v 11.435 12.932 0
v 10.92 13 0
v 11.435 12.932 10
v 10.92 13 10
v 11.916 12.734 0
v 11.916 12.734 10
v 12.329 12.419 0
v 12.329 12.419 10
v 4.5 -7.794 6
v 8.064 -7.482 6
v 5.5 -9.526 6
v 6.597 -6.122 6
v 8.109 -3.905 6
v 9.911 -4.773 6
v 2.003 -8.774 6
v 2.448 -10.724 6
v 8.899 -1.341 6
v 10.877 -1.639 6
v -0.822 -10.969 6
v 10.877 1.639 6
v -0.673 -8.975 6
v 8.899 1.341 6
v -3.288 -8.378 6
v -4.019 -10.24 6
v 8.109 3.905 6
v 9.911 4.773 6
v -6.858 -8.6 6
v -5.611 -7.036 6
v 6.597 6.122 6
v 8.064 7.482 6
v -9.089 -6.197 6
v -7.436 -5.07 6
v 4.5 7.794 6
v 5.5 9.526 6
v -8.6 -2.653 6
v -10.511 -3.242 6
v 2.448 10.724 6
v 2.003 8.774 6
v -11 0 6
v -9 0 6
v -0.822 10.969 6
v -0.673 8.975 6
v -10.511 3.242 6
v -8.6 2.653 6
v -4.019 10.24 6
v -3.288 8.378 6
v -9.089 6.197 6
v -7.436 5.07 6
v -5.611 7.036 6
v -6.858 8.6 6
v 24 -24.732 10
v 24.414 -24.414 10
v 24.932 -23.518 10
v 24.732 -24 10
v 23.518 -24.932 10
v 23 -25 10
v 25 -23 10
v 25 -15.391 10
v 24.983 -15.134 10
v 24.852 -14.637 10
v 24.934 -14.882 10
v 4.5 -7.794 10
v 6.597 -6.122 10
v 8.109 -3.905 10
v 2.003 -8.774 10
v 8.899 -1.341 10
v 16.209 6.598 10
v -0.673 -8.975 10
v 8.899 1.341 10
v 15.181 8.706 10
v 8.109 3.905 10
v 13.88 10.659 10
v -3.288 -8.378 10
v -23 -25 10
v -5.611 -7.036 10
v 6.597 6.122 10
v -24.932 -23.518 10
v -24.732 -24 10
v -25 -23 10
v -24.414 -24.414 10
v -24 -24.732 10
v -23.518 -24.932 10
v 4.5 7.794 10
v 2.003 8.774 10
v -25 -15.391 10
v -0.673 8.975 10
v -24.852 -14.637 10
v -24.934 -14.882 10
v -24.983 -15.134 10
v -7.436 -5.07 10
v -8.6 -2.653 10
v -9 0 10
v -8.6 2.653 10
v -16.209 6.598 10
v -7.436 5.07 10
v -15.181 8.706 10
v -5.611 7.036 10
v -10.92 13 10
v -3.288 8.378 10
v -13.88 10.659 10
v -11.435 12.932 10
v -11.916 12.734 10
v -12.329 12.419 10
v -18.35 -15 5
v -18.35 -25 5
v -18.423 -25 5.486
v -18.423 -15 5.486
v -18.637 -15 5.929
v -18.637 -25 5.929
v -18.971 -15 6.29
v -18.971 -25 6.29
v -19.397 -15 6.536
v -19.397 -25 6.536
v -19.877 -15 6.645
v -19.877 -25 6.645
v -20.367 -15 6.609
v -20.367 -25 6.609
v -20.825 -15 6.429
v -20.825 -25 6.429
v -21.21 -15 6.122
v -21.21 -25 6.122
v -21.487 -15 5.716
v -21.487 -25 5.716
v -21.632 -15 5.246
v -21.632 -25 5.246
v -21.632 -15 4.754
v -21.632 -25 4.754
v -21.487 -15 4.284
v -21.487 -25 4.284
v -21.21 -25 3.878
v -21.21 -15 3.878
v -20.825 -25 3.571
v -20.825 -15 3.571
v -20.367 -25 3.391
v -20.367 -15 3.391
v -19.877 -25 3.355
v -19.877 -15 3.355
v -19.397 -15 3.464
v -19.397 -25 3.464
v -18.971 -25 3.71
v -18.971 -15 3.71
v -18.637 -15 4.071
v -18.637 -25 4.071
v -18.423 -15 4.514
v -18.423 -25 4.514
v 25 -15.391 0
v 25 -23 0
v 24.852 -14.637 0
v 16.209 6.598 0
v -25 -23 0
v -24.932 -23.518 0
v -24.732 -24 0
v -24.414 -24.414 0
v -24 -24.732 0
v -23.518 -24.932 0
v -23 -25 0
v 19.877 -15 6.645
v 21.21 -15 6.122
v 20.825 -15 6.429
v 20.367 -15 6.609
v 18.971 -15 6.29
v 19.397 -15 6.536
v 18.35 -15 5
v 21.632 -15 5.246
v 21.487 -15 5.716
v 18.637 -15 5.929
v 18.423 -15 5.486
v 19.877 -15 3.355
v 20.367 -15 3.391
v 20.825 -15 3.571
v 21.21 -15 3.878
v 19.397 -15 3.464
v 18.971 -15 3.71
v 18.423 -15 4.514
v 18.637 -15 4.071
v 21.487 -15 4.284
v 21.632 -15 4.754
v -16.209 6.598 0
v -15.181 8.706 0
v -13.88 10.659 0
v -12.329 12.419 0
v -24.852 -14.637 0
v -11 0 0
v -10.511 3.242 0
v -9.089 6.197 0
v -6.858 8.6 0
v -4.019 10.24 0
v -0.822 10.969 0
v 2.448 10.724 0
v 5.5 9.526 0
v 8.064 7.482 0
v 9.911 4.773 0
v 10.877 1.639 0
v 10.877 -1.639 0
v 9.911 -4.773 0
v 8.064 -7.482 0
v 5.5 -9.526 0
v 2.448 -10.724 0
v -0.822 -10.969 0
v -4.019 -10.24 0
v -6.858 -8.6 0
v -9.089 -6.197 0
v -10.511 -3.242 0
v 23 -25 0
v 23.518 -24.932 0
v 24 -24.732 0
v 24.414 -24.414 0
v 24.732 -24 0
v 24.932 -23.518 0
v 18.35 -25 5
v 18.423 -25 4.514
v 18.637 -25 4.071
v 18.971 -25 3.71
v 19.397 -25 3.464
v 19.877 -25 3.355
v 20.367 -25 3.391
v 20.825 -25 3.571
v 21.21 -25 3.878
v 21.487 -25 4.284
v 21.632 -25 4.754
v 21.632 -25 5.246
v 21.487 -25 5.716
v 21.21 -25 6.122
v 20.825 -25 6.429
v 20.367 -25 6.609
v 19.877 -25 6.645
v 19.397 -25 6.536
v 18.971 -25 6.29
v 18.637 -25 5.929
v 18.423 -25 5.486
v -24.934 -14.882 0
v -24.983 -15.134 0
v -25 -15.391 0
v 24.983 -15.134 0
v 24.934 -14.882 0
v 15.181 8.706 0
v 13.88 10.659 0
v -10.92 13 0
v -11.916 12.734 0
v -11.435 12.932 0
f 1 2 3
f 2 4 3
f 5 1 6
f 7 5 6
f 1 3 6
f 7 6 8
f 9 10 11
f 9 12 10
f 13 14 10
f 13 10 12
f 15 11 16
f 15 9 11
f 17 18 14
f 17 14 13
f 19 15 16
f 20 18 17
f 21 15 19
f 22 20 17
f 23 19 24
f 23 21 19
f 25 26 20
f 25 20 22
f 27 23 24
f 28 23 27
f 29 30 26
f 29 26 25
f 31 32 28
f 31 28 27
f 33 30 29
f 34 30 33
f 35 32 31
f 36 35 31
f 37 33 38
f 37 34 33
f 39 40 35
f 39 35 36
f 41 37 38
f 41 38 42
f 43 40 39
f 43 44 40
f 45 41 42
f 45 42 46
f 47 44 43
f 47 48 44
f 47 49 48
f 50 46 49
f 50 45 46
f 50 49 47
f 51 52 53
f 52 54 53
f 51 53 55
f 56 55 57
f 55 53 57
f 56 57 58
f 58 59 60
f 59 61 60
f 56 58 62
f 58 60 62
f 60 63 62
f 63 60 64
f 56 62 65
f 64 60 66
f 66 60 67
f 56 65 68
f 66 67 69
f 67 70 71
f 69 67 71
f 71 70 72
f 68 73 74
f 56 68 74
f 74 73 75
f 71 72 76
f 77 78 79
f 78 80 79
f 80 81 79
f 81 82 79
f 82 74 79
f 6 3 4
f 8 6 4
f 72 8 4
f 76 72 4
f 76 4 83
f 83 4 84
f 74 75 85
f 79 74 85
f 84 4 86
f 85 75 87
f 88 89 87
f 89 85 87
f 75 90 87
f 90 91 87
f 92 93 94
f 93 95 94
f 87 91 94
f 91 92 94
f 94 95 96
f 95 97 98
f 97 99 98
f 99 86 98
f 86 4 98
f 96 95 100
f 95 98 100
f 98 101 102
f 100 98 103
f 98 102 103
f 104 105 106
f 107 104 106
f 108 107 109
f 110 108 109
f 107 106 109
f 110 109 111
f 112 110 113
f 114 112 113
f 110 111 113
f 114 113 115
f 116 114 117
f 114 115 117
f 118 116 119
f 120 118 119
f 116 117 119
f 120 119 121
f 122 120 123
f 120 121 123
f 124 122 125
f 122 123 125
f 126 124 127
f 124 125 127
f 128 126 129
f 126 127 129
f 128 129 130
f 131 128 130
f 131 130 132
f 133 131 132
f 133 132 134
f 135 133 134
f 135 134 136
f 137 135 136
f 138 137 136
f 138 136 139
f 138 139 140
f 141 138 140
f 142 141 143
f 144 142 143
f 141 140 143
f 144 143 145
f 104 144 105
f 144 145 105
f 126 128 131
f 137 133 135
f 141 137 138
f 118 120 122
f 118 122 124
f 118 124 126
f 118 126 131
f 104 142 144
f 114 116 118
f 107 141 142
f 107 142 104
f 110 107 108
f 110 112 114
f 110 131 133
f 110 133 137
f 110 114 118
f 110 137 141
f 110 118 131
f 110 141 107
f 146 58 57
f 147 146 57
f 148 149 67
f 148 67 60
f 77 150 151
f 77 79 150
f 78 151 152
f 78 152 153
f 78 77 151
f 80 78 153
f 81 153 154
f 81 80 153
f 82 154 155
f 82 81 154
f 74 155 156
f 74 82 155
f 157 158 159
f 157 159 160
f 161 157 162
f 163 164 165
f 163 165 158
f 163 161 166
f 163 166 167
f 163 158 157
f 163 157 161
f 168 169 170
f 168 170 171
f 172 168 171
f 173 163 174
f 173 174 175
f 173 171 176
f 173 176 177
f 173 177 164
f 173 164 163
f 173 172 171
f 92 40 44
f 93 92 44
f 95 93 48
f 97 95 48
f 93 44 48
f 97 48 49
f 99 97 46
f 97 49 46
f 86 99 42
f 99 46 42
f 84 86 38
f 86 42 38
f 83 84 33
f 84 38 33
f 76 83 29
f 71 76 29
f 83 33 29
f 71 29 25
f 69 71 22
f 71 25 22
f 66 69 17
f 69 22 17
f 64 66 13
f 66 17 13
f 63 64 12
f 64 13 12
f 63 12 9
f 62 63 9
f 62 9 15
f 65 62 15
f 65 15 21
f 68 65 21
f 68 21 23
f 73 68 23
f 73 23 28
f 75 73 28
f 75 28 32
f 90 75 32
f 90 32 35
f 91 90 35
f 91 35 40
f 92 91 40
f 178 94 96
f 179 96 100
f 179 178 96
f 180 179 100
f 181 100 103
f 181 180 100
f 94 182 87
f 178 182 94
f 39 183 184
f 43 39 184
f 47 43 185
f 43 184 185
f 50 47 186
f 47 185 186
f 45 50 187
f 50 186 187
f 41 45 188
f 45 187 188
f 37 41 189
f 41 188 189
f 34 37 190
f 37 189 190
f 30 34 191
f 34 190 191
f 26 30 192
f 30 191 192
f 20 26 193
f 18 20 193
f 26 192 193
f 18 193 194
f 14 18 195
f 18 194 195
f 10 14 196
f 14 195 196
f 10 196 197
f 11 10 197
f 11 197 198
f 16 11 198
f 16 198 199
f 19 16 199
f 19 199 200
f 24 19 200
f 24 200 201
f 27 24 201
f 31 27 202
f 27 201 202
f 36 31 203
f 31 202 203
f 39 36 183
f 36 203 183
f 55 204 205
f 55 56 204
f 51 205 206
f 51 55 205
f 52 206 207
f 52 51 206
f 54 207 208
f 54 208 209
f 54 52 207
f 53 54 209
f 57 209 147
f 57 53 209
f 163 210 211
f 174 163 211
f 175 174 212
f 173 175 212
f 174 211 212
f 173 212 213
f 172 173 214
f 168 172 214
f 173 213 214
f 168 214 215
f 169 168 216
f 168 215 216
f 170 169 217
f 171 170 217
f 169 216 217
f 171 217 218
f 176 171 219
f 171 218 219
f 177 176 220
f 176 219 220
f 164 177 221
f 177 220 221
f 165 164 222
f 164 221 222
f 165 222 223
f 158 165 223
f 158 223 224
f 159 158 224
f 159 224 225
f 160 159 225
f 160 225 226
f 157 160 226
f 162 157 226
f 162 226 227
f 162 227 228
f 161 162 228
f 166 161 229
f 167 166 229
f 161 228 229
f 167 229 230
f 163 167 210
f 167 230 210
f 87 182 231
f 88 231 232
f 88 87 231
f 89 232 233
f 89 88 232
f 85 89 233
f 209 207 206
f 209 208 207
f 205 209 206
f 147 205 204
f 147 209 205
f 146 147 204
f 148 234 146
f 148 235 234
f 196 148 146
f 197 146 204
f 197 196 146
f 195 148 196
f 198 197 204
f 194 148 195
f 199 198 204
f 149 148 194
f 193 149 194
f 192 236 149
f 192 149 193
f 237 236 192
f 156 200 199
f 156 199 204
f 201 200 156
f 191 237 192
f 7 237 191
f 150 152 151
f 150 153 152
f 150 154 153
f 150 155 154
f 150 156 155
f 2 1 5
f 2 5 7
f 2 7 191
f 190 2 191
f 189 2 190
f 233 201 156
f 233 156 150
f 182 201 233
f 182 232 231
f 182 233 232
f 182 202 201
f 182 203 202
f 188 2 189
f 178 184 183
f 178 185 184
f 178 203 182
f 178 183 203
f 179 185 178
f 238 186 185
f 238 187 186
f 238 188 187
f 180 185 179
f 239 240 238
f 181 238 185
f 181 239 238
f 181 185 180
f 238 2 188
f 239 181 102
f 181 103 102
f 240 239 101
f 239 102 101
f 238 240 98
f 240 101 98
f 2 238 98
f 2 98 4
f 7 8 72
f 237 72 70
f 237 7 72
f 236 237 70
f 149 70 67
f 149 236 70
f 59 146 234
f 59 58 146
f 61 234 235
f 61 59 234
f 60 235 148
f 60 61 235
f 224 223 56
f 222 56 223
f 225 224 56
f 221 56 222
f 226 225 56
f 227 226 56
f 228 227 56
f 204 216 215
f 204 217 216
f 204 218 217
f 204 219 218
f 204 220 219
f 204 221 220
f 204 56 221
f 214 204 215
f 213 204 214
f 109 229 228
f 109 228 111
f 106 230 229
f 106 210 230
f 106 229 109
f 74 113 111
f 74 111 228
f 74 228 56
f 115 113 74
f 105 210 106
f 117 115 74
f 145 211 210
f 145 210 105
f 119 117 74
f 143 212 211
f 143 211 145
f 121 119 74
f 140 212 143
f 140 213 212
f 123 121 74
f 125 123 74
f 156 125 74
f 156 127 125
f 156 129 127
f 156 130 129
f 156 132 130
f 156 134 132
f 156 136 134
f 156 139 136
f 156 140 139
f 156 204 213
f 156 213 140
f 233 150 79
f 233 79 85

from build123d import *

# Parameters (mm, degrees)
EXTRUDE_1_DEPTH     = 10
SKETCH_2_R          = 11
CUT_EXTRUDE_1_DEPTH = 6
SKETCH_3_R          = 1.65
CUT_EXTRUDE_2_DEPTH = 10
SKETCH_4_R          = 9
CUT_EXTRUDE_3_DEPTH = 36.860842154
FILLET_1_R          = 2


with BuildPart() as part:
    # ｽｹｯﾁ1 → ﾎﾞｽ - 押し出し1 (new body)
    with BuildSketch(Plane.XY):
        with BuildLine():
            Line((-25, -15), (-16.20863824, 6.597730399))
            ThreePointArc((-16.20863824, 6.597730399), (-14.32427611, 10.053114638), (-11.715374514, 13))
            Line((-11.715374514, 13), (11.715374514, 13))
            ThreePointArc((11.715374514, 13), (14.32427611, 10.053114638), (16.20863824, 6.597730399))
            Line((16.20863824, 6.597730399), (25, -15))
            Line((25, -15), (25, -25))
            Line((25, -25), (-25, -25))
            Line((-25, -25), (-25, -15))
        make_face()
    extrude(amount=EXTRUDE_1_DEPTH)

    # ｽｹｯﾁ2 → ｶｯﾄ - 押し出し1 (cut)
    with BuildSketch(Plane(origin=(0, 0, 0), x_dir=(-1, 0, 0), z_dir=(0, 0, -1))):
        Circle(SKETCH_2_R)
    extrude(amount=-CUT_EXTRUDE_1_DEPTH, mode=Mode.SUBTRACT)

    # ｽｹｯﾁ3 → ｶｯﾄ - 押し出し2 (cut)
    with BuildSketch(Plane.XZ.offset(25)):
        with Locations((-20, 5)):
            Circle(SKETCH_3_R)
        with Locations(Location((20, 5, 0), (0, 0, 180))):
            Circle(SKETCH_3_R)
    extrude(amount=-CUT_EXTRUDE_2_DEPTH, mode=Mode.SUBTRACT)

    # ｽｹｯﾁ4 → ｶｯﾄ - 押し出し3 (cut, through all)
    with BuildSketch(Plane(origin=(0, 0, 6), x_dir=(-1, 0, 0), z_dir=(0, 0, -1))):
        Circle(SKETCH_4_R)
    extrude(amount=-CUT_EXTRUDE_3_DEPTH, mode=Mode.SUBTRACT)

    # ﾌｨﾚｯﾄ1
    fillet_1_edges = [part.edges().sort_by_distance(p)[0] for p in [
        (25, -25, 5),
        (-25, -25, 5),
        (-25, -15, 5),
        (-11.715374514, 13, 5),
        (11.715374514, 13, 5),
        (25, -15, 5),
    ]]
    fillet(fillet_1_edges, radius=FILLET_1_R)


solid = part.part
